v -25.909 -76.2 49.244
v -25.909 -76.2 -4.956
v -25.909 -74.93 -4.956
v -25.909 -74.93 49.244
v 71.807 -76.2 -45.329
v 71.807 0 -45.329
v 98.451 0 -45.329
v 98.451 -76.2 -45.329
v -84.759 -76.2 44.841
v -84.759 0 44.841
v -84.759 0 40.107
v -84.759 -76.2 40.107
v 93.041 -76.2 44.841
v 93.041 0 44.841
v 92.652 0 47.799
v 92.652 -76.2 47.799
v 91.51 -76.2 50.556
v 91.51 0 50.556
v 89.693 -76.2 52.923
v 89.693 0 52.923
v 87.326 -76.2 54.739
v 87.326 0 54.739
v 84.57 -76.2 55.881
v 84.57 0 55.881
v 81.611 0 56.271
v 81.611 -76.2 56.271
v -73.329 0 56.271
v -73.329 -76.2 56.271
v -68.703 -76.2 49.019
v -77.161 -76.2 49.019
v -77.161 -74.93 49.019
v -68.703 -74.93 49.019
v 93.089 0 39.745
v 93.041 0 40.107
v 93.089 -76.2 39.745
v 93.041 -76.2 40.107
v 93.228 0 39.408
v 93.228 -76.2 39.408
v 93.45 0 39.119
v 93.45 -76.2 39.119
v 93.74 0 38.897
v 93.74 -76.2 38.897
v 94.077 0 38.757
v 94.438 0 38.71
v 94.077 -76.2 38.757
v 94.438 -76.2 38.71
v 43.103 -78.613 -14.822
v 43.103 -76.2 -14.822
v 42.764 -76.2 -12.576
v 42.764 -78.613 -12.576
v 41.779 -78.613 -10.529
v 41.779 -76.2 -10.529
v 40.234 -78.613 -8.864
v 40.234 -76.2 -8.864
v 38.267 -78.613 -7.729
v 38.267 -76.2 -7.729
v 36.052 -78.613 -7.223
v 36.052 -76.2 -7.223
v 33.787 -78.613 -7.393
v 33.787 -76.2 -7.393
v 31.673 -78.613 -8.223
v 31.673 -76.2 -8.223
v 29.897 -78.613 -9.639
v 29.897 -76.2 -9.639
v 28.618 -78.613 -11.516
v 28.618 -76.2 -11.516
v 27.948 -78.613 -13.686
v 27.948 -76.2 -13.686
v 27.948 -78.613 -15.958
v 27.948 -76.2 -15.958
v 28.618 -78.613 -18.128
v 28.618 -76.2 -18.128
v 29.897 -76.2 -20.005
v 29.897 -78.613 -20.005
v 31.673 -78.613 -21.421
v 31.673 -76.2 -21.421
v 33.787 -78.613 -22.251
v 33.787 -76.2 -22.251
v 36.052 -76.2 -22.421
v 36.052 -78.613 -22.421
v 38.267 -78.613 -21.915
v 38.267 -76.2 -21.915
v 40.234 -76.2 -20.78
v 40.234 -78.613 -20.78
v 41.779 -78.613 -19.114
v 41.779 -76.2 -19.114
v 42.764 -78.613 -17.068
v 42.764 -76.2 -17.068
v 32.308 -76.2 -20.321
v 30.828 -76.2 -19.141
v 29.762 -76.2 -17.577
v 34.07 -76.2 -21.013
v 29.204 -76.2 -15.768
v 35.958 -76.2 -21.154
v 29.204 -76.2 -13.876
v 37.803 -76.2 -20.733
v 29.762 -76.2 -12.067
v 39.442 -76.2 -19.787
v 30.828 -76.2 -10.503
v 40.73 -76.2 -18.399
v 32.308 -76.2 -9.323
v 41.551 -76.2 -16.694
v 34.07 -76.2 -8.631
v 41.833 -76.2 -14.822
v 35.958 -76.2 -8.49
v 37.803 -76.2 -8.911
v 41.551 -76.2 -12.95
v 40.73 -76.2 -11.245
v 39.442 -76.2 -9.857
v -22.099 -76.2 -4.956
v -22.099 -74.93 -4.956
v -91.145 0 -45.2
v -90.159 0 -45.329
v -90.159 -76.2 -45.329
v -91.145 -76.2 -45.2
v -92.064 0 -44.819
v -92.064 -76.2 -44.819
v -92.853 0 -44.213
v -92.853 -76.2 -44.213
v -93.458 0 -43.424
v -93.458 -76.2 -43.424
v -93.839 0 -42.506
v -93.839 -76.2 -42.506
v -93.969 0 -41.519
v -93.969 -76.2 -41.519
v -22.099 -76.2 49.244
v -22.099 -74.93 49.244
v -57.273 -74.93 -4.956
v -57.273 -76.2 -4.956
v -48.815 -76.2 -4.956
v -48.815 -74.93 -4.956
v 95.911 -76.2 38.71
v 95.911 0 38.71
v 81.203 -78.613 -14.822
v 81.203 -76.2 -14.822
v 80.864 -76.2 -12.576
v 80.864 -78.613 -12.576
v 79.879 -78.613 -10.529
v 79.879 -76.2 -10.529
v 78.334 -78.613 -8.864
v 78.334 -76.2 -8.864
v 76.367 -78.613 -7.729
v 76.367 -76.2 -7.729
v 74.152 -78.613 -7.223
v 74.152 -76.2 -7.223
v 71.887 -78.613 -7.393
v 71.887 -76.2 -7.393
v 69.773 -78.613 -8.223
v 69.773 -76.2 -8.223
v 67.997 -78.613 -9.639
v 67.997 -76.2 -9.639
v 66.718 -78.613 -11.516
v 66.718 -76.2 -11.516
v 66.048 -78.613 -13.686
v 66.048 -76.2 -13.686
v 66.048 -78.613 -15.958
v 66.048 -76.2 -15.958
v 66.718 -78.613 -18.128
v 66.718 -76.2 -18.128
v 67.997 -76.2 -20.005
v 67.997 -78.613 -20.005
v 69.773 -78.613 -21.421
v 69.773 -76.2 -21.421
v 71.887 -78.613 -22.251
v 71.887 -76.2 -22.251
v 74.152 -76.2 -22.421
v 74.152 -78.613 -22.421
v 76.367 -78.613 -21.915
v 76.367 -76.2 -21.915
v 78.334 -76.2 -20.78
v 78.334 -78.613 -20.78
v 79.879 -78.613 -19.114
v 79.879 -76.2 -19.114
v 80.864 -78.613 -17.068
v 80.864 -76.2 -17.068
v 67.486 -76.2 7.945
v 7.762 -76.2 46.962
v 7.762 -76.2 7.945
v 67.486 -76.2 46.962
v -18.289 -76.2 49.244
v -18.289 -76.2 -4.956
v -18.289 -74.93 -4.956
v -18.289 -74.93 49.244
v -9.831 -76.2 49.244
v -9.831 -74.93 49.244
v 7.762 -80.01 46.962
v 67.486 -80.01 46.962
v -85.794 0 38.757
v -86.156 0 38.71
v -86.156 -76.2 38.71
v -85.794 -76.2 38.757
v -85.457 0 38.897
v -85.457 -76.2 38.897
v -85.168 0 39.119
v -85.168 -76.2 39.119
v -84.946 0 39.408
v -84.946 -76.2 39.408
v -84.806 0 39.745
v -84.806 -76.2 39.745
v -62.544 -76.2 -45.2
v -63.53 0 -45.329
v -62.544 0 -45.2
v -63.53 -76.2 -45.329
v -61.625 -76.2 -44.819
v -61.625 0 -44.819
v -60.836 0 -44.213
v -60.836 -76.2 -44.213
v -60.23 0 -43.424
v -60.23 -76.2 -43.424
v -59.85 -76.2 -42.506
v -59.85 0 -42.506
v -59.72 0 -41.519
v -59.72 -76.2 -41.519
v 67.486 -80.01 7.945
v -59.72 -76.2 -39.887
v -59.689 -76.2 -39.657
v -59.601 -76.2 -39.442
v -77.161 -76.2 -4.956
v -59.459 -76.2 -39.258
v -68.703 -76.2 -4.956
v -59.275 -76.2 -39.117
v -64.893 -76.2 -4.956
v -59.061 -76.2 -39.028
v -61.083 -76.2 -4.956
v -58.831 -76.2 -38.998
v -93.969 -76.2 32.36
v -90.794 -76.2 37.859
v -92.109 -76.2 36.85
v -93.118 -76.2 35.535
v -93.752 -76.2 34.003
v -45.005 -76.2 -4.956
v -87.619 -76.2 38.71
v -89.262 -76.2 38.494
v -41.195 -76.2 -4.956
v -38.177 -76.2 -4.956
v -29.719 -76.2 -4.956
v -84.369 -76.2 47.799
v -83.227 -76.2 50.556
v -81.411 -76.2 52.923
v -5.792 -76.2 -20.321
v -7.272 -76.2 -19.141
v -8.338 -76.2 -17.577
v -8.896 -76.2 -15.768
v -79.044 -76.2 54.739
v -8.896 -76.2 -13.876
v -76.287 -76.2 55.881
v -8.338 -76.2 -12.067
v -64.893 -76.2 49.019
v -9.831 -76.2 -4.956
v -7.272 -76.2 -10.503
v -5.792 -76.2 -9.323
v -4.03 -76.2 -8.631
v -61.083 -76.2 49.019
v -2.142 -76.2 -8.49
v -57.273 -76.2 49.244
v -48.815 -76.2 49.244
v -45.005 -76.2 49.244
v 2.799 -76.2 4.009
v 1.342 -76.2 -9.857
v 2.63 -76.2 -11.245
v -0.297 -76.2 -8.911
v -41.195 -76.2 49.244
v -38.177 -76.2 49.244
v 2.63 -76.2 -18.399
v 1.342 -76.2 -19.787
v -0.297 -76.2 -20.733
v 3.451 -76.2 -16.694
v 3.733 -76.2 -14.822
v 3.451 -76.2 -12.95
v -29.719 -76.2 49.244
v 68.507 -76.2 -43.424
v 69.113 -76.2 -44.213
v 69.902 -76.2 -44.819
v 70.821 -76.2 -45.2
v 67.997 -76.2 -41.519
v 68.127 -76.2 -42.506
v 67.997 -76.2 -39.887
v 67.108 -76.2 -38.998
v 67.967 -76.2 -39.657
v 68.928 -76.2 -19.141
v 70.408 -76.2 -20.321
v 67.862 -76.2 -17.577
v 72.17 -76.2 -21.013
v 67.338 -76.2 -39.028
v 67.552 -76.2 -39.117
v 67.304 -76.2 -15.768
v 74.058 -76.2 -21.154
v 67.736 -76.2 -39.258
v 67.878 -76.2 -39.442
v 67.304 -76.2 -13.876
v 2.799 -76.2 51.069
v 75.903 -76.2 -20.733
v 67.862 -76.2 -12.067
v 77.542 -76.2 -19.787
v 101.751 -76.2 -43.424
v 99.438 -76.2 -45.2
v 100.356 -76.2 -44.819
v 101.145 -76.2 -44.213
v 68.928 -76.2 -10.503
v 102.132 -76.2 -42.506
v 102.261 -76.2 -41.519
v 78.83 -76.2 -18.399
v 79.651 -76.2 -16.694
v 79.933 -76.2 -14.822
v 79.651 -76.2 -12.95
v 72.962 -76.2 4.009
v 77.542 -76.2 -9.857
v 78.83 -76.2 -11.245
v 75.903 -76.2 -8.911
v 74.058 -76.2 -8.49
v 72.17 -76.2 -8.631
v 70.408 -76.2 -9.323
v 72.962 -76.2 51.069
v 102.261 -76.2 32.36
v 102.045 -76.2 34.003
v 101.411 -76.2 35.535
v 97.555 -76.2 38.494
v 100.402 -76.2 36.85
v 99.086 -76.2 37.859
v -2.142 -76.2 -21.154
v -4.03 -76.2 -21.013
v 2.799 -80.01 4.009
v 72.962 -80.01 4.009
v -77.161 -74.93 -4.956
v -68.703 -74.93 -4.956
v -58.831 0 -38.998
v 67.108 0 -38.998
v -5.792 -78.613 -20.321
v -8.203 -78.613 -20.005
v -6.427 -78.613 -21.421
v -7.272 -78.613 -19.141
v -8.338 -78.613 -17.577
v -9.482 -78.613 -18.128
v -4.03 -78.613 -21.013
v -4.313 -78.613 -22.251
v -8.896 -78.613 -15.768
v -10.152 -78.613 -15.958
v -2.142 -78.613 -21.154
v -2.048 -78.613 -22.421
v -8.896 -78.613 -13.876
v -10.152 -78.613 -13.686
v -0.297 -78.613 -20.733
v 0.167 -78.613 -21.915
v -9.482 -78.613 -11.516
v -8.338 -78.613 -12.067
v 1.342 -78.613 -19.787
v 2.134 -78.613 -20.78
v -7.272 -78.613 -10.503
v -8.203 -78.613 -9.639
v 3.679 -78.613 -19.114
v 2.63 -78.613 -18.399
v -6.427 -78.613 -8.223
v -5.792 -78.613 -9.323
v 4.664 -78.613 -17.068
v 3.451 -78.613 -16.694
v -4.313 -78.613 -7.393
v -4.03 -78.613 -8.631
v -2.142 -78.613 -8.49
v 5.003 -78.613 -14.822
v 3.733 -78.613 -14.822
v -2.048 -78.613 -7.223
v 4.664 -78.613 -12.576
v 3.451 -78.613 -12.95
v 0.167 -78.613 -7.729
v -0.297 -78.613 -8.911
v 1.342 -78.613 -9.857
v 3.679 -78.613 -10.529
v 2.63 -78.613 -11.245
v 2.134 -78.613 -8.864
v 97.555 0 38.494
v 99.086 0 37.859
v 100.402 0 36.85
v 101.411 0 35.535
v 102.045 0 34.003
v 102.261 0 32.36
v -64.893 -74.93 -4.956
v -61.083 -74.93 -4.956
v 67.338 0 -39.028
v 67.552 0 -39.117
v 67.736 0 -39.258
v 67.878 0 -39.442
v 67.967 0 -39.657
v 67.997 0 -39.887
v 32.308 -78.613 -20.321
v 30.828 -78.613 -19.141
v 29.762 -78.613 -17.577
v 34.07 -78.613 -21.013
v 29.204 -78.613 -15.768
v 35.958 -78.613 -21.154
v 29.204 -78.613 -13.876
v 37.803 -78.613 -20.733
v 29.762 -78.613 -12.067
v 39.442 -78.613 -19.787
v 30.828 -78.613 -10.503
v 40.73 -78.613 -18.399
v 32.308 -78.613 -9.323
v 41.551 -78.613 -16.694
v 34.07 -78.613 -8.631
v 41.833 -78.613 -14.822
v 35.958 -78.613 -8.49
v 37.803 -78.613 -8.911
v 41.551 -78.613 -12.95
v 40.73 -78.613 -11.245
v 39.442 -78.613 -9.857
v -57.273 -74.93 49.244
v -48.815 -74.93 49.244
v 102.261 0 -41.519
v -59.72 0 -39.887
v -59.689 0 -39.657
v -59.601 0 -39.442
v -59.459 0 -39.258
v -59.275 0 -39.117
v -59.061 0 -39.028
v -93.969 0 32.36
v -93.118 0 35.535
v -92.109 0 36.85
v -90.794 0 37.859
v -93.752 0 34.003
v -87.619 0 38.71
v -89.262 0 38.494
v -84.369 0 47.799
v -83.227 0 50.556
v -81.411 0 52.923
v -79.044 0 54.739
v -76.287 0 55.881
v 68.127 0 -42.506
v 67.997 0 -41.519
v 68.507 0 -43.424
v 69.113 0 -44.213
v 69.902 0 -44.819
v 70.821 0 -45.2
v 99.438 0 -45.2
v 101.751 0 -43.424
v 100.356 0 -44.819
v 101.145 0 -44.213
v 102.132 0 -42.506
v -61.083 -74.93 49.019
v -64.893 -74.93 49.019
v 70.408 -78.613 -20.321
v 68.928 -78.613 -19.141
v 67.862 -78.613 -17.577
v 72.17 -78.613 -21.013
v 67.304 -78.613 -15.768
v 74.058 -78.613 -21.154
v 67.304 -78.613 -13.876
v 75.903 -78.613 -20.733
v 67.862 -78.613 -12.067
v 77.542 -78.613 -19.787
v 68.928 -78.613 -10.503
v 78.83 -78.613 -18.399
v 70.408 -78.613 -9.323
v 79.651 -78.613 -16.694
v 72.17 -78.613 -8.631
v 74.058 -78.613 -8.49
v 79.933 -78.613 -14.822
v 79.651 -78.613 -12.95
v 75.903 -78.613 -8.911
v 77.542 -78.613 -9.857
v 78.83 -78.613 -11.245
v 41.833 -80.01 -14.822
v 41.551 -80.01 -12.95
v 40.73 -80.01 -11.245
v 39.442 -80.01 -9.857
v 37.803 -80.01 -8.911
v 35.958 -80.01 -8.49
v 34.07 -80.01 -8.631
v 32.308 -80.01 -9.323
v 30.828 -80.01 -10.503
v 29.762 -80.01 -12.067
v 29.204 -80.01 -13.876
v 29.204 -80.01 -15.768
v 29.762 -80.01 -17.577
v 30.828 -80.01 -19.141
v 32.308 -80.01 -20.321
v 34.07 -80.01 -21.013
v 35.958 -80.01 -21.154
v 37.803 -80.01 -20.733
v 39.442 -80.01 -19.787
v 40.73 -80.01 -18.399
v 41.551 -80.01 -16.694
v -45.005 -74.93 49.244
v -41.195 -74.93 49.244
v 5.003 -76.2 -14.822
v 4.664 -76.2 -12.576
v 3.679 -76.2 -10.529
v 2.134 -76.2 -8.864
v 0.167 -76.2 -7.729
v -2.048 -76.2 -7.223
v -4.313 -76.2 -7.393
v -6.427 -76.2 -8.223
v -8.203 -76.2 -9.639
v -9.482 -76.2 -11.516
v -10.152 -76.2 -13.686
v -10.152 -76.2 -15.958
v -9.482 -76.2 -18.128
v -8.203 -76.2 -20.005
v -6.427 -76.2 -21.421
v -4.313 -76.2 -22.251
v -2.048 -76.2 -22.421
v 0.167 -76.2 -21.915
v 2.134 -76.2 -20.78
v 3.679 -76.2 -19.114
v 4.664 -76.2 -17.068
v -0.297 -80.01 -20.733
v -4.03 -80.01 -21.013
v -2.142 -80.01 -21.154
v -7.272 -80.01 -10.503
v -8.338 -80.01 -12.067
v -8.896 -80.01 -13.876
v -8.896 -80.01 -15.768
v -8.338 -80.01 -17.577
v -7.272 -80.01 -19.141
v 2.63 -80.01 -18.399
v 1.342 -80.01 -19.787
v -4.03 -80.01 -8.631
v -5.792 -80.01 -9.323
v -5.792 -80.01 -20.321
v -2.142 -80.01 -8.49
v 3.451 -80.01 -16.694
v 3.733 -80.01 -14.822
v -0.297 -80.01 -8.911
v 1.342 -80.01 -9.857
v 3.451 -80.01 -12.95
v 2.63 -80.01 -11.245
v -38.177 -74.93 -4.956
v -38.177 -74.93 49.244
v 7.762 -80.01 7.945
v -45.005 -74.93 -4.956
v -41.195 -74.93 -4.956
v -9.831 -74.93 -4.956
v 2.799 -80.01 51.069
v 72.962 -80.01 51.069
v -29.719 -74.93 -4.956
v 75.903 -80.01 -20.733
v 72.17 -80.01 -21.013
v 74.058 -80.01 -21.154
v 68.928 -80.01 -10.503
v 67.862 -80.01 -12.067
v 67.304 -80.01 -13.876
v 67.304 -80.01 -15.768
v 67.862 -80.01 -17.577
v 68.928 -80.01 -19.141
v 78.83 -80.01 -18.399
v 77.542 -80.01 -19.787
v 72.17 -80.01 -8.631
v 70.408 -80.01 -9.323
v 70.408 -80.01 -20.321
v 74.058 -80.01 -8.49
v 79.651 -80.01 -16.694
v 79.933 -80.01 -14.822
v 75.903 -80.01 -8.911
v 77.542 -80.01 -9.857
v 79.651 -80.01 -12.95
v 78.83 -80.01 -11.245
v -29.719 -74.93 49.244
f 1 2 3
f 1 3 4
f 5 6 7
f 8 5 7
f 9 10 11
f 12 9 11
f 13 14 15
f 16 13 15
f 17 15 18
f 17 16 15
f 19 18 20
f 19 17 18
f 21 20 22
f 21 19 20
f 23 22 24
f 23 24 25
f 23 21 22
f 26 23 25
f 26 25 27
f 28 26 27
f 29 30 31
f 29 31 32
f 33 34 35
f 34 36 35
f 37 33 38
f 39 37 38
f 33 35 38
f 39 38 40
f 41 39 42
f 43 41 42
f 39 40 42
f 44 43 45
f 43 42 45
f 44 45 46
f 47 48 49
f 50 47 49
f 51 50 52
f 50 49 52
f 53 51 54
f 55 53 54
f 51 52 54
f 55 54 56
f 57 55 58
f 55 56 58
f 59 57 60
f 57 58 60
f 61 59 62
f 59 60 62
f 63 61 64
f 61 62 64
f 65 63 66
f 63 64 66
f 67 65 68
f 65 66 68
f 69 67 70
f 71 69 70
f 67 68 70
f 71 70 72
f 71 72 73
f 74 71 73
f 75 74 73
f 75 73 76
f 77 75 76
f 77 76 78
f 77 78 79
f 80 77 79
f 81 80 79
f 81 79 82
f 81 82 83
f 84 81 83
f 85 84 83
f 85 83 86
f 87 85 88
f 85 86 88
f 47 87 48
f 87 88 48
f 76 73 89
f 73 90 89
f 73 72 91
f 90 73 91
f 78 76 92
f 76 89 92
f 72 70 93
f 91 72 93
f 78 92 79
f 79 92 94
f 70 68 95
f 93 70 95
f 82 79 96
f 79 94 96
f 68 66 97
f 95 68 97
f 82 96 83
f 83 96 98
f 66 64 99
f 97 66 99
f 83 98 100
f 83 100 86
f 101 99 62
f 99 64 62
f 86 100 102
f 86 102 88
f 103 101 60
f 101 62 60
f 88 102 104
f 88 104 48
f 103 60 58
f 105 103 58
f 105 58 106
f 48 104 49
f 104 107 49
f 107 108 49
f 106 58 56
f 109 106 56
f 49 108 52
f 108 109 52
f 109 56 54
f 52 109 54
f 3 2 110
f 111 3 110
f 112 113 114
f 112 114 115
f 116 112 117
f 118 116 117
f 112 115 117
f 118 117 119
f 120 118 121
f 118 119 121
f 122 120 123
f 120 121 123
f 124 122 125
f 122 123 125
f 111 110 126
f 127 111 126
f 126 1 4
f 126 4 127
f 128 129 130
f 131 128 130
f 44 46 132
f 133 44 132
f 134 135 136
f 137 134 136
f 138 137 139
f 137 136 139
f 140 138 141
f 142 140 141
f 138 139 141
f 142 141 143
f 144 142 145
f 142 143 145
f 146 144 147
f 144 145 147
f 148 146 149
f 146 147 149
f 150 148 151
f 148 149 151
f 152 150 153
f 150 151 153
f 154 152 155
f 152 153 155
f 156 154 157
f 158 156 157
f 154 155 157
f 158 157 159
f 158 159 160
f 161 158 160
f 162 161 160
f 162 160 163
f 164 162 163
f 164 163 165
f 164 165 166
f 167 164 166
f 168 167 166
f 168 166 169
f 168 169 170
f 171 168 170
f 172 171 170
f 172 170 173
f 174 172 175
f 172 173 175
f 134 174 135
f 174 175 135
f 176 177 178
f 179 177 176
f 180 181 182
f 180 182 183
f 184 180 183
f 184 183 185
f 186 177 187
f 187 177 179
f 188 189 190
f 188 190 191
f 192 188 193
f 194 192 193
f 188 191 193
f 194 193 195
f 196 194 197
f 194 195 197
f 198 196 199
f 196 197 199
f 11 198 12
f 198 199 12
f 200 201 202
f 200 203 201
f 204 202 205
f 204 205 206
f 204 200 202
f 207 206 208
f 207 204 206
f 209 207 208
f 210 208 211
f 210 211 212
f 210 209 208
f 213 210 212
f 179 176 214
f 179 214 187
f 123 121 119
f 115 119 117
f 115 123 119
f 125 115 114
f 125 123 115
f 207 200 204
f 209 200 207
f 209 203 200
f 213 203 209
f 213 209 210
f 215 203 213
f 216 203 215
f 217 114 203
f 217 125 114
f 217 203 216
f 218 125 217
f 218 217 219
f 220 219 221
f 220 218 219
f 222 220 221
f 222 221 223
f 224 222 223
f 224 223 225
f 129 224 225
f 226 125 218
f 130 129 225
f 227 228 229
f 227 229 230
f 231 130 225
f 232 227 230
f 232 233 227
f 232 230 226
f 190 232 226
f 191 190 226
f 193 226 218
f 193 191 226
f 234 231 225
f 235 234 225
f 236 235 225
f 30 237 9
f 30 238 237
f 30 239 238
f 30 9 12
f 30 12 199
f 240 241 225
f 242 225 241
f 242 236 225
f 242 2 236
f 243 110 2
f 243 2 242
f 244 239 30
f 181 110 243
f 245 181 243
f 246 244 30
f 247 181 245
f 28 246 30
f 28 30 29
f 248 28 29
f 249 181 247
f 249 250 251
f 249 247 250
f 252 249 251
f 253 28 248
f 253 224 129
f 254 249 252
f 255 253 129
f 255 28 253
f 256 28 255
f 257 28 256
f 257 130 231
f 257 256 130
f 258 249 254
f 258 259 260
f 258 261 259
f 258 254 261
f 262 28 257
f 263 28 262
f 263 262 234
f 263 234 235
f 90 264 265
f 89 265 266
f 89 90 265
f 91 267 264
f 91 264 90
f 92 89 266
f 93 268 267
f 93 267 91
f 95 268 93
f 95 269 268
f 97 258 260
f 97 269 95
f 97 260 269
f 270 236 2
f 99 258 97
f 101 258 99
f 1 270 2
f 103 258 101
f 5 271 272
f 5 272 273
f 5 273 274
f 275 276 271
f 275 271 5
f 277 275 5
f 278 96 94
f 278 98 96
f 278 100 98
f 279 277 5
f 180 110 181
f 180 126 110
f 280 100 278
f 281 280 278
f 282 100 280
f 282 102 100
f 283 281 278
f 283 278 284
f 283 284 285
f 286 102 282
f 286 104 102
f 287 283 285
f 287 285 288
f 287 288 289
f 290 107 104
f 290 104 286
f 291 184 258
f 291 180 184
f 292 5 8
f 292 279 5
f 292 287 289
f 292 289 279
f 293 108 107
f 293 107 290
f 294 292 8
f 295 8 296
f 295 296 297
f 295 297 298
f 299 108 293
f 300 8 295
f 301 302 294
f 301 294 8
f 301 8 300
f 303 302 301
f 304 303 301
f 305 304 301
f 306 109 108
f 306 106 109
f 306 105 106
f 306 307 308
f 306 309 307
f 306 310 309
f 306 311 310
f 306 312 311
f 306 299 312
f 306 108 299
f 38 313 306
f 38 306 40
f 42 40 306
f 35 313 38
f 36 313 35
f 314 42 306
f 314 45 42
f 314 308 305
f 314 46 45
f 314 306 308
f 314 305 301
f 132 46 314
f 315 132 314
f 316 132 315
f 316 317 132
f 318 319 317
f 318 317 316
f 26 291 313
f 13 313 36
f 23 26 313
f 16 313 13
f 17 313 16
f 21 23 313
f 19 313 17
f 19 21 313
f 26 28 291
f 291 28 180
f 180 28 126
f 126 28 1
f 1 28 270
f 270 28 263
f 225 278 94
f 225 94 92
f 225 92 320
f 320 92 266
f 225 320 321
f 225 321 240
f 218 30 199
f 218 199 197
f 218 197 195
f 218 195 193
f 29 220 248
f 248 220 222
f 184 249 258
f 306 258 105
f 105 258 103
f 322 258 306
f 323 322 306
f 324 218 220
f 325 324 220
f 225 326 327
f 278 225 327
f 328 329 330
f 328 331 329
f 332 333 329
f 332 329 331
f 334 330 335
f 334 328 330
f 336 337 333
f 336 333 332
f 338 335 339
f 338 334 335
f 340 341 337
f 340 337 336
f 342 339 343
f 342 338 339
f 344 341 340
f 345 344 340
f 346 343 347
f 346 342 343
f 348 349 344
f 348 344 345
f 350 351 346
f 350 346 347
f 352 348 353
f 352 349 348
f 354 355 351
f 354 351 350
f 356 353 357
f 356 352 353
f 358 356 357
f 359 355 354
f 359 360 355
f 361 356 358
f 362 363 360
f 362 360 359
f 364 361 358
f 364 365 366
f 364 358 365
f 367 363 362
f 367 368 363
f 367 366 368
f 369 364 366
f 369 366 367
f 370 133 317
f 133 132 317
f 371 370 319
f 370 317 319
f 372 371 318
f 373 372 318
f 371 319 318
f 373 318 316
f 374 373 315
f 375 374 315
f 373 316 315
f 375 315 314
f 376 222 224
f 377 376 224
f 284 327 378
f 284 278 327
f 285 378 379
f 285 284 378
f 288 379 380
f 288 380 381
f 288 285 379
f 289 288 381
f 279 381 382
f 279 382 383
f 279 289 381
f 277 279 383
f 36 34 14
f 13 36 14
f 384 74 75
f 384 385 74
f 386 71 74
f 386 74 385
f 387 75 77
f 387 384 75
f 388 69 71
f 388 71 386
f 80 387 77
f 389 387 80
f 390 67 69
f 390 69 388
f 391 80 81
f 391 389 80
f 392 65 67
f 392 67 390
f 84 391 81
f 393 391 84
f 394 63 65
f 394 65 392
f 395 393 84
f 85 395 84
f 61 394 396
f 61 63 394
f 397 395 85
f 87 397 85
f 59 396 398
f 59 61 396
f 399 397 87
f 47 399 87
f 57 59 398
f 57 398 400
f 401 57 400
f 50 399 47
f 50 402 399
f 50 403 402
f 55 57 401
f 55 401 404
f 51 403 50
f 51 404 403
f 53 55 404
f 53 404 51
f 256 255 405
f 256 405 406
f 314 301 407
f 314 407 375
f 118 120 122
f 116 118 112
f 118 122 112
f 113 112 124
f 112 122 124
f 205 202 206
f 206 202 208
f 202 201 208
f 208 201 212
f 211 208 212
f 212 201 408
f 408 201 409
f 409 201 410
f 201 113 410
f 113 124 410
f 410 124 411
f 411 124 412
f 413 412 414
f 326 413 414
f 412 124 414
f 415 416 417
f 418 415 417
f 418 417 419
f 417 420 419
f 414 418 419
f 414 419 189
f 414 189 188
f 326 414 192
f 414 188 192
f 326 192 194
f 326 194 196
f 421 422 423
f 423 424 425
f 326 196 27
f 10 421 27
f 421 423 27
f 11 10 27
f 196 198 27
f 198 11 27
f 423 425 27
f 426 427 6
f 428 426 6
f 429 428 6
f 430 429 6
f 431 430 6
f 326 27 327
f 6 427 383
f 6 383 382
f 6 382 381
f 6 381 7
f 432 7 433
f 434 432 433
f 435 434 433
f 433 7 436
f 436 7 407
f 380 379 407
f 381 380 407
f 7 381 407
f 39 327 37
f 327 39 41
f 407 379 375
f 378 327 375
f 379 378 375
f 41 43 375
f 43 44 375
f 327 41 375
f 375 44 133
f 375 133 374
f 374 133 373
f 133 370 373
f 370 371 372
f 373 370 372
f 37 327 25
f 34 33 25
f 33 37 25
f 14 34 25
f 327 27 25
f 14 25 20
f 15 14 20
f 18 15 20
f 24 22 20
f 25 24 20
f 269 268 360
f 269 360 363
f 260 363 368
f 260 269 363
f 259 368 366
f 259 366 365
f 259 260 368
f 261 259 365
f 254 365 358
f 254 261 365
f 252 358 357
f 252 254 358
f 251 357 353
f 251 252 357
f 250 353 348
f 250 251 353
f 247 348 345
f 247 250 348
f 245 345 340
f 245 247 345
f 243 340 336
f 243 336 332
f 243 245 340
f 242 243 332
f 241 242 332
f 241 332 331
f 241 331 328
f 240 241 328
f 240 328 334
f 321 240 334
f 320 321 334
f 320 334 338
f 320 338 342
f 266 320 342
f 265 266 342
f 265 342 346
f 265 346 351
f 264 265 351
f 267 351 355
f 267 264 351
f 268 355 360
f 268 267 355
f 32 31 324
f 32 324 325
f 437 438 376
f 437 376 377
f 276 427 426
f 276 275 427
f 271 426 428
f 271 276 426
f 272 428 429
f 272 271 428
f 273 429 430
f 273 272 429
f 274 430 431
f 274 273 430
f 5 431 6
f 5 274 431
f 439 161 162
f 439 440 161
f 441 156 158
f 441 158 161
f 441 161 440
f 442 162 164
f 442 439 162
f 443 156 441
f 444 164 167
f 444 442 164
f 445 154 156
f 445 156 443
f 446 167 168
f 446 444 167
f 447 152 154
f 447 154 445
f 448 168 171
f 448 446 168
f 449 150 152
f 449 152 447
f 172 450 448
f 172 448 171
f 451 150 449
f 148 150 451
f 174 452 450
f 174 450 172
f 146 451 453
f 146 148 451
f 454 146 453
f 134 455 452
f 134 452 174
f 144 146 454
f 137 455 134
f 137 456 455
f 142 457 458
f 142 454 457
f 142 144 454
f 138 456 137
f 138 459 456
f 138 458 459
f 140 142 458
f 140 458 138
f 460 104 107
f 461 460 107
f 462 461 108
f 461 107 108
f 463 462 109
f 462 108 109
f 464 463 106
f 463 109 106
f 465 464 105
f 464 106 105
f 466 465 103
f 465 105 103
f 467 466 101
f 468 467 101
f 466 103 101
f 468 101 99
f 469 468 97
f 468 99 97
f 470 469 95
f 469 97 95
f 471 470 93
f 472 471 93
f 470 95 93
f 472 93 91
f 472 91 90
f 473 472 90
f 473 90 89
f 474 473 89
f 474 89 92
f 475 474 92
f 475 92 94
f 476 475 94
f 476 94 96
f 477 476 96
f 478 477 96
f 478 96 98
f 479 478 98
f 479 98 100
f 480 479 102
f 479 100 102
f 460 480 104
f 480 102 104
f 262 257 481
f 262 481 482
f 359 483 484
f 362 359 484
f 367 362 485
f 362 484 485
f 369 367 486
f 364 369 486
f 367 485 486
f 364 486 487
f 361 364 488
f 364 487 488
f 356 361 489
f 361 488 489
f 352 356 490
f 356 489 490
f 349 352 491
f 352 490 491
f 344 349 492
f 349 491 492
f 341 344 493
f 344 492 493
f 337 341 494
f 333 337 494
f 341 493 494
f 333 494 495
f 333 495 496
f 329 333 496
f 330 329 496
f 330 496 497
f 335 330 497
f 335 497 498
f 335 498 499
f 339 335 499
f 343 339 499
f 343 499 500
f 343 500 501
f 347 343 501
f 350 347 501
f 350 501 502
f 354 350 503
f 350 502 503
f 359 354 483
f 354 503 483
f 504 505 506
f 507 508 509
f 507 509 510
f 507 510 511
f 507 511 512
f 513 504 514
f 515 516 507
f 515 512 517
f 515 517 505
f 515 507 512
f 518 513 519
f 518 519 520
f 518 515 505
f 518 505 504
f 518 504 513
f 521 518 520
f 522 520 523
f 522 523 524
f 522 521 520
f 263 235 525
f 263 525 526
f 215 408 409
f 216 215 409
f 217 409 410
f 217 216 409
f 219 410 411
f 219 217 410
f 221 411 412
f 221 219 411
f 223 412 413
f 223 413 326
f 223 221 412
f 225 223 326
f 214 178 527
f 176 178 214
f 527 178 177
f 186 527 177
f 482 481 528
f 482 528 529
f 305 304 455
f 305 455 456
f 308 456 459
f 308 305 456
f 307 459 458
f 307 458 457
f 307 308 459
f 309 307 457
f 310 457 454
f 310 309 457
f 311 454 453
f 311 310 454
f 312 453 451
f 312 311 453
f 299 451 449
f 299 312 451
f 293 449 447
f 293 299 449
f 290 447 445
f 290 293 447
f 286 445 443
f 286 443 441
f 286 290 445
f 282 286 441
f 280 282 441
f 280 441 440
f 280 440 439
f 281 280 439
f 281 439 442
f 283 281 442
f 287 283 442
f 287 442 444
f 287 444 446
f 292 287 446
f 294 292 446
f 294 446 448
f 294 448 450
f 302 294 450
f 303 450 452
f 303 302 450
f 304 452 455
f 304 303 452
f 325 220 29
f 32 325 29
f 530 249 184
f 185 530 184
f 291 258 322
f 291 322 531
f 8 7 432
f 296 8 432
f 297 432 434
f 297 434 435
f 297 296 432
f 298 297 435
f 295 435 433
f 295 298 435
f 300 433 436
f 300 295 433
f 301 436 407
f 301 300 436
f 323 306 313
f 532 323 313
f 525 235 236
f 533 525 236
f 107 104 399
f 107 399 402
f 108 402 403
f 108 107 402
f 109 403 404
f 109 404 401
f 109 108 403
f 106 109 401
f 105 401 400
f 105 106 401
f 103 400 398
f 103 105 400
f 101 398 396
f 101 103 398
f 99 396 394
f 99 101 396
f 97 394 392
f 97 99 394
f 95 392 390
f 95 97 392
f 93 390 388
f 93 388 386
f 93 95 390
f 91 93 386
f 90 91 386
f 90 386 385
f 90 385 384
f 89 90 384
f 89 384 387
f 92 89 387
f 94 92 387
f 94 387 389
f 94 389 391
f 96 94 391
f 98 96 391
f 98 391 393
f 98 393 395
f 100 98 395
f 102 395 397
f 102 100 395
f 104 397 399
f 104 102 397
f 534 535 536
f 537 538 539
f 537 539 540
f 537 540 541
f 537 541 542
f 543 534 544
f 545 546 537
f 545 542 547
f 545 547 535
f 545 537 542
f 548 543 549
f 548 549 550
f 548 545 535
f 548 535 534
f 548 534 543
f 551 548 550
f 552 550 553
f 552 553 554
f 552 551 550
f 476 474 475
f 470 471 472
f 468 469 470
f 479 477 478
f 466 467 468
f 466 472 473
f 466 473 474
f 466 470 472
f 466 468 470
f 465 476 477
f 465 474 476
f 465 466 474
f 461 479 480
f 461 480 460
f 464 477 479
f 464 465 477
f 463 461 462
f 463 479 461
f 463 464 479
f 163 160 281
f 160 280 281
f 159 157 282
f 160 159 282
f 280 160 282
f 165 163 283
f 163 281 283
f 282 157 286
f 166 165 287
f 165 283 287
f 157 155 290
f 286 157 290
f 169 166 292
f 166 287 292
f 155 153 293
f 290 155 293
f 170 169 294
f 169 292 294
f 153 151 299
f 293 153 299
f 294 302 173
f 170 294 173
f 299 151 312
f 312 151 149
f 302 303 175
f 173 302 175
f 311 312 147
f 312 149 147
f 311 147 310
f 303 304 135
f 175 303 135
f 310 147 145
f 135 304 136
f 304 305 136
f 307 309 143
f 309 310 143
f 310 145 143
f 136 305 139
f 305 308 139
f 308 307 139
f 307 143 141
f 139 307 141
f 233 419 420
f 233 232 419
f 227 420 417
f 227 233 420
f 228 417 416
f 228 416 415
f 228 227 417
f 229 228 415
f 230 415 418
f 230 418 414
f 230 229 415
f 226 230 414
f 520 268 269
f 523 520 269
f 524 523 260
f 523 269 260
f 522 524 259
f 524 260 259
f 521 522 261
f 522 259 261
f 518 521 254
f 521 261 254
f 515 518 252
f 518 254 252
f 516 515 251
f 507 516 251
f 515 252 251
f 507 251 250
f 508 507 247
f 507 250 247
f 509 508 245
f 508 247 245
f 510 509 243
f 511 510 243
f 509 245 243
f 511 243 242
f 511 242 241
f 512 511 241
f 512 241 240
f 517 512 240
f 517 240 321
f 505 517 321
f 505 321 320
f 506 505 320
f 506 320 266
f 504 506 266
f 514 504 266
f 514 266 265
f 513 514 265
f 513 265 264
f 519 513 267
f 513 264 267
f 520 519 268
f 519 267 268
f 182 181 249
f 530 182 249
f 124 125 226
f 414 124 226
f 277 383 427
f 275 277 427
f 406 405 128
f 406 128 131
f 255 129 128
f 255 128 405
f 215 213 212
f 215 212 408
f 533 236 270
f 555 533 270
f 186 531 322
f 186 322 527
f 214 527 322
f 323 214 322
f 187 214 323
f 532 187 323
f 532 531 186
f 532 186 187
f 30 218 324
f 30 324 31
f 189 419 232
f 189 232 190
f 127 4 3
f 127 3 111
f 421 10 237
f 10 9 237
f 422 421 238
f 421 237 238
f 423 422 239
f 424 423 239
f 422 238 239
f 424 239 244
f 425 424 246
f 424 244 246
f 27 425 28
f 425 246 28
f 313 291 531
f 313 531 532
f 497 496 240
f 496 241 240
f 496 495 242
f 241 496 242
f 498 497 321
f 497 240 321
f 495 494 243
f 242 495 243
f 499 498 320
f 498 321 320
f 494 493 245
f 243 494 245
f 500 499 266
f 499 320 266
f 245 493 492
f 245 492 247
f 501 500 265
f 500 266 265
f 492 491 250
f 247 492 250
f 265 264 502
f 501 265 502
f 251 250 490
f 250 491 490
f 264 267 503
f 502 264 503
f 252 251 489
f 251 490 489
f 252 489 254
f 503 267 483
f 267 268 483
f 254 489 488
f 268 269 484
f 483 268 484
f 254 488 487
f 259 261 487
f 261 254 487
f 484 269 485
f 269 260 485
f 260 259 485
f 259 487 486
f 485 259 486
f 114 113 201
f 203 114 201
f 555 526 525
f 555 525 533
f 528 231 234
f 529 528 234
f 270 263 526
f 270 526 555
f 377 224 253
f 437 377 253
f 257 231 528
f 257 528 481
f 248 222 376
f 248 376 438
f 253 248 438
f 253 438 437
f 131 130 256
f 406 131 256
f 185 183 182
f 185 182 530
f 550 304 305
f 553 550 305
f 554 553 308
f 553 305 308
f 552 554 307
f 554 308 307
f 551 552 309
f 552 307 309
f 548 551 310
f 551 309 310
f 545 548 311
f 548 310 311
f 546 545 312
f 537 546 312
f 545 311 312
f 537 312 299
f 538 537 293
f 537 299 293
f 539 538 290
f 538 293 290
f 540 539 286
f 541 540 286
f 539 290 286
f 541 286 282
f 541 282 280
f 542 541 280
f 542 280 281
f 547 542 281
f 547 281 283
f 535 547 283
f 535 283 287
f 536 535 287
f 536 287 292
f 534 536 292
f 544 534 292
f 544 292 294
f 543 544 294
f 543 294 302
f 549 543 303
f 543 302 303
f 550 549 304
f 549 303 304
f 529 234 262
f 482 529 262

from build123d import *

# Parameters (mm, degrees)
F0_W      = 9.209789
F0_H      = 84.039282
F0_W_2    = 9.2202
F1_DEPTH  = 76.2
F2_R      = 6.35
F3_DEPTH  = 3.81
F2_R_2    = 7.62
F4_DEPTH  = 2.413
F2_W      = 8.4582
F2_H      = 53.975
F2_W_2    = 3.81
F2_H_2    = 54.199426
F5_DEPTH  = 1.27
F6_R      = 6.35
F7_R      = 11.43
F8_R      = 3.81
F9_R      = 3.81
F10_R     = 1.397
F11_R     = 0.889
F12_W     = 70.163437
F12_H     = 47.06084
F12_W_2   = 59.724488
F12_H_2   = 39.017717
F13_DEPTH = 3.81


with BuildPart() as f1:
    # F0 (on Front) → F1 (new body)
    with BuildSketch(Plane.XZ):
        Polygon((93.041204, 56.270593), (-84.758796, 56.270593), (-84.758796, 38.709875), (-84.758796, -45.329407), (-59.719693, -45.329407), (-59.719693, -38.99768), (67.996804, -38.99768), (67.996804, -45.329407), (93.041204, -45.329407), (93.041204, 38.709875), align=None)
        with Locations((-89.36369, -3.309766)):
            Rectangle(F0_W, F0_H)
        with Locations((97.651304, -3.309766)):
            Rectangle(F0_W_2, F0_H)
    extrude(amount=F1_DEPTH)

    # F2 (on face) → F3 (join)
    with BuildSketch(Plane.XZ.offset(76.2)):
        with Locations((-2.617028, -14.821997)):
            Circle(F2_R)
        with Locations((35.482972, -14.821997)):
            Circle(F2_R)
        with Locations((73.582972, -14.821997)):
            Circle(F2_R)
    extrude(amount=F3_DEPTH)

    # F2 (on face) → F5 (cut)
    with BuildSketch(Plane.XZ.offset(76.2)):
        with Locations((-72.931884, 22.031748)):
            Rectangle(F2_W, F2_H)
        with Locations((-62.987784, 22.031748)):
            Rectangle(F2_W_2, F2_H)
        with Locations((-53.043684, 22.143961)):
            Rectangle(F2_W, F2_H_2)
        with Locations((-43.099584, 22.143961)):
            Rectangle(F2_W_2, F2_H_2)
        with Locations((-33.948312, 22.143961)):
            Rectangle(F2_W, F2_H_2)
        with Locations((-24.004212, 22.143961)):
            Rectangle(F2_W_2, F2_H_2)
        with Locations((-14.060112, 22.143961)):
            Rectangle(F2_W, F2_H_2)
    extrude(amount=-F5_DEPTH, mode=Mode.SUBTRACT)

    # F6
    f6_edges = [f1.edges().sort_by_distance(p)[0] for p in [
        (102.261404, -38.1, 38.709875),
        (-93.968585, -38.1, 38.709875),
    ]]
    fillet(f6_edges, radius=F6_R)

    # F7
    f7_edges = [f1.edges().sort_by_distance(p)[0] for p in [
        (93.041204, -38.1, 56.270593),
        (-84.758796, -38.1, 56.270593),
    ]]
    fillet(f7_edges, radius=F7_R)

    # F8
    f8_edges = [f1.edges().sort_by_distance(p)[0] for p in [
        (67.996804, -38.1, -45.329407),
        (-59.719693, -38.1, -45.329407),
    ]]
    fillet(f8_edges, radius=F8_R)

    # F9
    f9_edges = [f1.edges().sort_by_distance(p)[0] for p in [
        (102.261404, -38.1, -45.329407),
        (-93.968585, -38.1, -45.329407),
    ]]
    fillet(f9_edges, radius=F9_R)

    # F10
    f10_edges = [f1.edges().sort_by_distance(p)[0] for p in [
        (93.041204, -38.1, 38.709875),
        (-84.758796, -38.1, 38.709875),
    ]]
    fillet(f10_edges, radius=F10_R)

    # F11
    f11_edges = [f1.edges().sort_by_distance(p)[0] for p in [
        (67.996804, -38.1, -38.99768),
        (-59.719693, -38.1, -38.99768),
    ]]
    fillet(f11_edges, radius=F11_R)

    # F12 (on face) → F13 (join)
    with BuildSketch(Plane.XZ.offset(76.2)):
        with Locations((37.880565, 27.53894)):
            Rectangle(F12_W, F12_H)
        with Locations((37.623871, 27.453377)):
            Rectangle(F12_W_2, F12_H_2, mode=Mode.SUBTRACT)
    extrude(amount=F13_DEPTH)


with BuildPart() as f4:
    # F2 (on face) → F4 (new body)
    with BuildSketch(Plane.XZ.offset(76.2)):
        with Locations((-2.617028, -14.821997)):
            Circle(F2_R_2)
        with Locations((-2.617028, -14.821997)):
            Circle(F2_R, mode=Mode.SUBTRACT)
        with Locations((35.482972, -14.821997)):
            Circle(F2_R_2)
        with Locations((35.482972, -14.821997)):
            Circle(F2_R, mode=Mode.SUBTRACT)
        with Locations((73.582972, -14.821997)):
            Circle(F2_R_2)
        with Locations((73.582972, -14.821997)):
            Circle(F2_R, mode=Mode.SUBTRACT)
    extrude(amount=F4_DEPTH)


solid = Compound([f1.part, f4.part])
